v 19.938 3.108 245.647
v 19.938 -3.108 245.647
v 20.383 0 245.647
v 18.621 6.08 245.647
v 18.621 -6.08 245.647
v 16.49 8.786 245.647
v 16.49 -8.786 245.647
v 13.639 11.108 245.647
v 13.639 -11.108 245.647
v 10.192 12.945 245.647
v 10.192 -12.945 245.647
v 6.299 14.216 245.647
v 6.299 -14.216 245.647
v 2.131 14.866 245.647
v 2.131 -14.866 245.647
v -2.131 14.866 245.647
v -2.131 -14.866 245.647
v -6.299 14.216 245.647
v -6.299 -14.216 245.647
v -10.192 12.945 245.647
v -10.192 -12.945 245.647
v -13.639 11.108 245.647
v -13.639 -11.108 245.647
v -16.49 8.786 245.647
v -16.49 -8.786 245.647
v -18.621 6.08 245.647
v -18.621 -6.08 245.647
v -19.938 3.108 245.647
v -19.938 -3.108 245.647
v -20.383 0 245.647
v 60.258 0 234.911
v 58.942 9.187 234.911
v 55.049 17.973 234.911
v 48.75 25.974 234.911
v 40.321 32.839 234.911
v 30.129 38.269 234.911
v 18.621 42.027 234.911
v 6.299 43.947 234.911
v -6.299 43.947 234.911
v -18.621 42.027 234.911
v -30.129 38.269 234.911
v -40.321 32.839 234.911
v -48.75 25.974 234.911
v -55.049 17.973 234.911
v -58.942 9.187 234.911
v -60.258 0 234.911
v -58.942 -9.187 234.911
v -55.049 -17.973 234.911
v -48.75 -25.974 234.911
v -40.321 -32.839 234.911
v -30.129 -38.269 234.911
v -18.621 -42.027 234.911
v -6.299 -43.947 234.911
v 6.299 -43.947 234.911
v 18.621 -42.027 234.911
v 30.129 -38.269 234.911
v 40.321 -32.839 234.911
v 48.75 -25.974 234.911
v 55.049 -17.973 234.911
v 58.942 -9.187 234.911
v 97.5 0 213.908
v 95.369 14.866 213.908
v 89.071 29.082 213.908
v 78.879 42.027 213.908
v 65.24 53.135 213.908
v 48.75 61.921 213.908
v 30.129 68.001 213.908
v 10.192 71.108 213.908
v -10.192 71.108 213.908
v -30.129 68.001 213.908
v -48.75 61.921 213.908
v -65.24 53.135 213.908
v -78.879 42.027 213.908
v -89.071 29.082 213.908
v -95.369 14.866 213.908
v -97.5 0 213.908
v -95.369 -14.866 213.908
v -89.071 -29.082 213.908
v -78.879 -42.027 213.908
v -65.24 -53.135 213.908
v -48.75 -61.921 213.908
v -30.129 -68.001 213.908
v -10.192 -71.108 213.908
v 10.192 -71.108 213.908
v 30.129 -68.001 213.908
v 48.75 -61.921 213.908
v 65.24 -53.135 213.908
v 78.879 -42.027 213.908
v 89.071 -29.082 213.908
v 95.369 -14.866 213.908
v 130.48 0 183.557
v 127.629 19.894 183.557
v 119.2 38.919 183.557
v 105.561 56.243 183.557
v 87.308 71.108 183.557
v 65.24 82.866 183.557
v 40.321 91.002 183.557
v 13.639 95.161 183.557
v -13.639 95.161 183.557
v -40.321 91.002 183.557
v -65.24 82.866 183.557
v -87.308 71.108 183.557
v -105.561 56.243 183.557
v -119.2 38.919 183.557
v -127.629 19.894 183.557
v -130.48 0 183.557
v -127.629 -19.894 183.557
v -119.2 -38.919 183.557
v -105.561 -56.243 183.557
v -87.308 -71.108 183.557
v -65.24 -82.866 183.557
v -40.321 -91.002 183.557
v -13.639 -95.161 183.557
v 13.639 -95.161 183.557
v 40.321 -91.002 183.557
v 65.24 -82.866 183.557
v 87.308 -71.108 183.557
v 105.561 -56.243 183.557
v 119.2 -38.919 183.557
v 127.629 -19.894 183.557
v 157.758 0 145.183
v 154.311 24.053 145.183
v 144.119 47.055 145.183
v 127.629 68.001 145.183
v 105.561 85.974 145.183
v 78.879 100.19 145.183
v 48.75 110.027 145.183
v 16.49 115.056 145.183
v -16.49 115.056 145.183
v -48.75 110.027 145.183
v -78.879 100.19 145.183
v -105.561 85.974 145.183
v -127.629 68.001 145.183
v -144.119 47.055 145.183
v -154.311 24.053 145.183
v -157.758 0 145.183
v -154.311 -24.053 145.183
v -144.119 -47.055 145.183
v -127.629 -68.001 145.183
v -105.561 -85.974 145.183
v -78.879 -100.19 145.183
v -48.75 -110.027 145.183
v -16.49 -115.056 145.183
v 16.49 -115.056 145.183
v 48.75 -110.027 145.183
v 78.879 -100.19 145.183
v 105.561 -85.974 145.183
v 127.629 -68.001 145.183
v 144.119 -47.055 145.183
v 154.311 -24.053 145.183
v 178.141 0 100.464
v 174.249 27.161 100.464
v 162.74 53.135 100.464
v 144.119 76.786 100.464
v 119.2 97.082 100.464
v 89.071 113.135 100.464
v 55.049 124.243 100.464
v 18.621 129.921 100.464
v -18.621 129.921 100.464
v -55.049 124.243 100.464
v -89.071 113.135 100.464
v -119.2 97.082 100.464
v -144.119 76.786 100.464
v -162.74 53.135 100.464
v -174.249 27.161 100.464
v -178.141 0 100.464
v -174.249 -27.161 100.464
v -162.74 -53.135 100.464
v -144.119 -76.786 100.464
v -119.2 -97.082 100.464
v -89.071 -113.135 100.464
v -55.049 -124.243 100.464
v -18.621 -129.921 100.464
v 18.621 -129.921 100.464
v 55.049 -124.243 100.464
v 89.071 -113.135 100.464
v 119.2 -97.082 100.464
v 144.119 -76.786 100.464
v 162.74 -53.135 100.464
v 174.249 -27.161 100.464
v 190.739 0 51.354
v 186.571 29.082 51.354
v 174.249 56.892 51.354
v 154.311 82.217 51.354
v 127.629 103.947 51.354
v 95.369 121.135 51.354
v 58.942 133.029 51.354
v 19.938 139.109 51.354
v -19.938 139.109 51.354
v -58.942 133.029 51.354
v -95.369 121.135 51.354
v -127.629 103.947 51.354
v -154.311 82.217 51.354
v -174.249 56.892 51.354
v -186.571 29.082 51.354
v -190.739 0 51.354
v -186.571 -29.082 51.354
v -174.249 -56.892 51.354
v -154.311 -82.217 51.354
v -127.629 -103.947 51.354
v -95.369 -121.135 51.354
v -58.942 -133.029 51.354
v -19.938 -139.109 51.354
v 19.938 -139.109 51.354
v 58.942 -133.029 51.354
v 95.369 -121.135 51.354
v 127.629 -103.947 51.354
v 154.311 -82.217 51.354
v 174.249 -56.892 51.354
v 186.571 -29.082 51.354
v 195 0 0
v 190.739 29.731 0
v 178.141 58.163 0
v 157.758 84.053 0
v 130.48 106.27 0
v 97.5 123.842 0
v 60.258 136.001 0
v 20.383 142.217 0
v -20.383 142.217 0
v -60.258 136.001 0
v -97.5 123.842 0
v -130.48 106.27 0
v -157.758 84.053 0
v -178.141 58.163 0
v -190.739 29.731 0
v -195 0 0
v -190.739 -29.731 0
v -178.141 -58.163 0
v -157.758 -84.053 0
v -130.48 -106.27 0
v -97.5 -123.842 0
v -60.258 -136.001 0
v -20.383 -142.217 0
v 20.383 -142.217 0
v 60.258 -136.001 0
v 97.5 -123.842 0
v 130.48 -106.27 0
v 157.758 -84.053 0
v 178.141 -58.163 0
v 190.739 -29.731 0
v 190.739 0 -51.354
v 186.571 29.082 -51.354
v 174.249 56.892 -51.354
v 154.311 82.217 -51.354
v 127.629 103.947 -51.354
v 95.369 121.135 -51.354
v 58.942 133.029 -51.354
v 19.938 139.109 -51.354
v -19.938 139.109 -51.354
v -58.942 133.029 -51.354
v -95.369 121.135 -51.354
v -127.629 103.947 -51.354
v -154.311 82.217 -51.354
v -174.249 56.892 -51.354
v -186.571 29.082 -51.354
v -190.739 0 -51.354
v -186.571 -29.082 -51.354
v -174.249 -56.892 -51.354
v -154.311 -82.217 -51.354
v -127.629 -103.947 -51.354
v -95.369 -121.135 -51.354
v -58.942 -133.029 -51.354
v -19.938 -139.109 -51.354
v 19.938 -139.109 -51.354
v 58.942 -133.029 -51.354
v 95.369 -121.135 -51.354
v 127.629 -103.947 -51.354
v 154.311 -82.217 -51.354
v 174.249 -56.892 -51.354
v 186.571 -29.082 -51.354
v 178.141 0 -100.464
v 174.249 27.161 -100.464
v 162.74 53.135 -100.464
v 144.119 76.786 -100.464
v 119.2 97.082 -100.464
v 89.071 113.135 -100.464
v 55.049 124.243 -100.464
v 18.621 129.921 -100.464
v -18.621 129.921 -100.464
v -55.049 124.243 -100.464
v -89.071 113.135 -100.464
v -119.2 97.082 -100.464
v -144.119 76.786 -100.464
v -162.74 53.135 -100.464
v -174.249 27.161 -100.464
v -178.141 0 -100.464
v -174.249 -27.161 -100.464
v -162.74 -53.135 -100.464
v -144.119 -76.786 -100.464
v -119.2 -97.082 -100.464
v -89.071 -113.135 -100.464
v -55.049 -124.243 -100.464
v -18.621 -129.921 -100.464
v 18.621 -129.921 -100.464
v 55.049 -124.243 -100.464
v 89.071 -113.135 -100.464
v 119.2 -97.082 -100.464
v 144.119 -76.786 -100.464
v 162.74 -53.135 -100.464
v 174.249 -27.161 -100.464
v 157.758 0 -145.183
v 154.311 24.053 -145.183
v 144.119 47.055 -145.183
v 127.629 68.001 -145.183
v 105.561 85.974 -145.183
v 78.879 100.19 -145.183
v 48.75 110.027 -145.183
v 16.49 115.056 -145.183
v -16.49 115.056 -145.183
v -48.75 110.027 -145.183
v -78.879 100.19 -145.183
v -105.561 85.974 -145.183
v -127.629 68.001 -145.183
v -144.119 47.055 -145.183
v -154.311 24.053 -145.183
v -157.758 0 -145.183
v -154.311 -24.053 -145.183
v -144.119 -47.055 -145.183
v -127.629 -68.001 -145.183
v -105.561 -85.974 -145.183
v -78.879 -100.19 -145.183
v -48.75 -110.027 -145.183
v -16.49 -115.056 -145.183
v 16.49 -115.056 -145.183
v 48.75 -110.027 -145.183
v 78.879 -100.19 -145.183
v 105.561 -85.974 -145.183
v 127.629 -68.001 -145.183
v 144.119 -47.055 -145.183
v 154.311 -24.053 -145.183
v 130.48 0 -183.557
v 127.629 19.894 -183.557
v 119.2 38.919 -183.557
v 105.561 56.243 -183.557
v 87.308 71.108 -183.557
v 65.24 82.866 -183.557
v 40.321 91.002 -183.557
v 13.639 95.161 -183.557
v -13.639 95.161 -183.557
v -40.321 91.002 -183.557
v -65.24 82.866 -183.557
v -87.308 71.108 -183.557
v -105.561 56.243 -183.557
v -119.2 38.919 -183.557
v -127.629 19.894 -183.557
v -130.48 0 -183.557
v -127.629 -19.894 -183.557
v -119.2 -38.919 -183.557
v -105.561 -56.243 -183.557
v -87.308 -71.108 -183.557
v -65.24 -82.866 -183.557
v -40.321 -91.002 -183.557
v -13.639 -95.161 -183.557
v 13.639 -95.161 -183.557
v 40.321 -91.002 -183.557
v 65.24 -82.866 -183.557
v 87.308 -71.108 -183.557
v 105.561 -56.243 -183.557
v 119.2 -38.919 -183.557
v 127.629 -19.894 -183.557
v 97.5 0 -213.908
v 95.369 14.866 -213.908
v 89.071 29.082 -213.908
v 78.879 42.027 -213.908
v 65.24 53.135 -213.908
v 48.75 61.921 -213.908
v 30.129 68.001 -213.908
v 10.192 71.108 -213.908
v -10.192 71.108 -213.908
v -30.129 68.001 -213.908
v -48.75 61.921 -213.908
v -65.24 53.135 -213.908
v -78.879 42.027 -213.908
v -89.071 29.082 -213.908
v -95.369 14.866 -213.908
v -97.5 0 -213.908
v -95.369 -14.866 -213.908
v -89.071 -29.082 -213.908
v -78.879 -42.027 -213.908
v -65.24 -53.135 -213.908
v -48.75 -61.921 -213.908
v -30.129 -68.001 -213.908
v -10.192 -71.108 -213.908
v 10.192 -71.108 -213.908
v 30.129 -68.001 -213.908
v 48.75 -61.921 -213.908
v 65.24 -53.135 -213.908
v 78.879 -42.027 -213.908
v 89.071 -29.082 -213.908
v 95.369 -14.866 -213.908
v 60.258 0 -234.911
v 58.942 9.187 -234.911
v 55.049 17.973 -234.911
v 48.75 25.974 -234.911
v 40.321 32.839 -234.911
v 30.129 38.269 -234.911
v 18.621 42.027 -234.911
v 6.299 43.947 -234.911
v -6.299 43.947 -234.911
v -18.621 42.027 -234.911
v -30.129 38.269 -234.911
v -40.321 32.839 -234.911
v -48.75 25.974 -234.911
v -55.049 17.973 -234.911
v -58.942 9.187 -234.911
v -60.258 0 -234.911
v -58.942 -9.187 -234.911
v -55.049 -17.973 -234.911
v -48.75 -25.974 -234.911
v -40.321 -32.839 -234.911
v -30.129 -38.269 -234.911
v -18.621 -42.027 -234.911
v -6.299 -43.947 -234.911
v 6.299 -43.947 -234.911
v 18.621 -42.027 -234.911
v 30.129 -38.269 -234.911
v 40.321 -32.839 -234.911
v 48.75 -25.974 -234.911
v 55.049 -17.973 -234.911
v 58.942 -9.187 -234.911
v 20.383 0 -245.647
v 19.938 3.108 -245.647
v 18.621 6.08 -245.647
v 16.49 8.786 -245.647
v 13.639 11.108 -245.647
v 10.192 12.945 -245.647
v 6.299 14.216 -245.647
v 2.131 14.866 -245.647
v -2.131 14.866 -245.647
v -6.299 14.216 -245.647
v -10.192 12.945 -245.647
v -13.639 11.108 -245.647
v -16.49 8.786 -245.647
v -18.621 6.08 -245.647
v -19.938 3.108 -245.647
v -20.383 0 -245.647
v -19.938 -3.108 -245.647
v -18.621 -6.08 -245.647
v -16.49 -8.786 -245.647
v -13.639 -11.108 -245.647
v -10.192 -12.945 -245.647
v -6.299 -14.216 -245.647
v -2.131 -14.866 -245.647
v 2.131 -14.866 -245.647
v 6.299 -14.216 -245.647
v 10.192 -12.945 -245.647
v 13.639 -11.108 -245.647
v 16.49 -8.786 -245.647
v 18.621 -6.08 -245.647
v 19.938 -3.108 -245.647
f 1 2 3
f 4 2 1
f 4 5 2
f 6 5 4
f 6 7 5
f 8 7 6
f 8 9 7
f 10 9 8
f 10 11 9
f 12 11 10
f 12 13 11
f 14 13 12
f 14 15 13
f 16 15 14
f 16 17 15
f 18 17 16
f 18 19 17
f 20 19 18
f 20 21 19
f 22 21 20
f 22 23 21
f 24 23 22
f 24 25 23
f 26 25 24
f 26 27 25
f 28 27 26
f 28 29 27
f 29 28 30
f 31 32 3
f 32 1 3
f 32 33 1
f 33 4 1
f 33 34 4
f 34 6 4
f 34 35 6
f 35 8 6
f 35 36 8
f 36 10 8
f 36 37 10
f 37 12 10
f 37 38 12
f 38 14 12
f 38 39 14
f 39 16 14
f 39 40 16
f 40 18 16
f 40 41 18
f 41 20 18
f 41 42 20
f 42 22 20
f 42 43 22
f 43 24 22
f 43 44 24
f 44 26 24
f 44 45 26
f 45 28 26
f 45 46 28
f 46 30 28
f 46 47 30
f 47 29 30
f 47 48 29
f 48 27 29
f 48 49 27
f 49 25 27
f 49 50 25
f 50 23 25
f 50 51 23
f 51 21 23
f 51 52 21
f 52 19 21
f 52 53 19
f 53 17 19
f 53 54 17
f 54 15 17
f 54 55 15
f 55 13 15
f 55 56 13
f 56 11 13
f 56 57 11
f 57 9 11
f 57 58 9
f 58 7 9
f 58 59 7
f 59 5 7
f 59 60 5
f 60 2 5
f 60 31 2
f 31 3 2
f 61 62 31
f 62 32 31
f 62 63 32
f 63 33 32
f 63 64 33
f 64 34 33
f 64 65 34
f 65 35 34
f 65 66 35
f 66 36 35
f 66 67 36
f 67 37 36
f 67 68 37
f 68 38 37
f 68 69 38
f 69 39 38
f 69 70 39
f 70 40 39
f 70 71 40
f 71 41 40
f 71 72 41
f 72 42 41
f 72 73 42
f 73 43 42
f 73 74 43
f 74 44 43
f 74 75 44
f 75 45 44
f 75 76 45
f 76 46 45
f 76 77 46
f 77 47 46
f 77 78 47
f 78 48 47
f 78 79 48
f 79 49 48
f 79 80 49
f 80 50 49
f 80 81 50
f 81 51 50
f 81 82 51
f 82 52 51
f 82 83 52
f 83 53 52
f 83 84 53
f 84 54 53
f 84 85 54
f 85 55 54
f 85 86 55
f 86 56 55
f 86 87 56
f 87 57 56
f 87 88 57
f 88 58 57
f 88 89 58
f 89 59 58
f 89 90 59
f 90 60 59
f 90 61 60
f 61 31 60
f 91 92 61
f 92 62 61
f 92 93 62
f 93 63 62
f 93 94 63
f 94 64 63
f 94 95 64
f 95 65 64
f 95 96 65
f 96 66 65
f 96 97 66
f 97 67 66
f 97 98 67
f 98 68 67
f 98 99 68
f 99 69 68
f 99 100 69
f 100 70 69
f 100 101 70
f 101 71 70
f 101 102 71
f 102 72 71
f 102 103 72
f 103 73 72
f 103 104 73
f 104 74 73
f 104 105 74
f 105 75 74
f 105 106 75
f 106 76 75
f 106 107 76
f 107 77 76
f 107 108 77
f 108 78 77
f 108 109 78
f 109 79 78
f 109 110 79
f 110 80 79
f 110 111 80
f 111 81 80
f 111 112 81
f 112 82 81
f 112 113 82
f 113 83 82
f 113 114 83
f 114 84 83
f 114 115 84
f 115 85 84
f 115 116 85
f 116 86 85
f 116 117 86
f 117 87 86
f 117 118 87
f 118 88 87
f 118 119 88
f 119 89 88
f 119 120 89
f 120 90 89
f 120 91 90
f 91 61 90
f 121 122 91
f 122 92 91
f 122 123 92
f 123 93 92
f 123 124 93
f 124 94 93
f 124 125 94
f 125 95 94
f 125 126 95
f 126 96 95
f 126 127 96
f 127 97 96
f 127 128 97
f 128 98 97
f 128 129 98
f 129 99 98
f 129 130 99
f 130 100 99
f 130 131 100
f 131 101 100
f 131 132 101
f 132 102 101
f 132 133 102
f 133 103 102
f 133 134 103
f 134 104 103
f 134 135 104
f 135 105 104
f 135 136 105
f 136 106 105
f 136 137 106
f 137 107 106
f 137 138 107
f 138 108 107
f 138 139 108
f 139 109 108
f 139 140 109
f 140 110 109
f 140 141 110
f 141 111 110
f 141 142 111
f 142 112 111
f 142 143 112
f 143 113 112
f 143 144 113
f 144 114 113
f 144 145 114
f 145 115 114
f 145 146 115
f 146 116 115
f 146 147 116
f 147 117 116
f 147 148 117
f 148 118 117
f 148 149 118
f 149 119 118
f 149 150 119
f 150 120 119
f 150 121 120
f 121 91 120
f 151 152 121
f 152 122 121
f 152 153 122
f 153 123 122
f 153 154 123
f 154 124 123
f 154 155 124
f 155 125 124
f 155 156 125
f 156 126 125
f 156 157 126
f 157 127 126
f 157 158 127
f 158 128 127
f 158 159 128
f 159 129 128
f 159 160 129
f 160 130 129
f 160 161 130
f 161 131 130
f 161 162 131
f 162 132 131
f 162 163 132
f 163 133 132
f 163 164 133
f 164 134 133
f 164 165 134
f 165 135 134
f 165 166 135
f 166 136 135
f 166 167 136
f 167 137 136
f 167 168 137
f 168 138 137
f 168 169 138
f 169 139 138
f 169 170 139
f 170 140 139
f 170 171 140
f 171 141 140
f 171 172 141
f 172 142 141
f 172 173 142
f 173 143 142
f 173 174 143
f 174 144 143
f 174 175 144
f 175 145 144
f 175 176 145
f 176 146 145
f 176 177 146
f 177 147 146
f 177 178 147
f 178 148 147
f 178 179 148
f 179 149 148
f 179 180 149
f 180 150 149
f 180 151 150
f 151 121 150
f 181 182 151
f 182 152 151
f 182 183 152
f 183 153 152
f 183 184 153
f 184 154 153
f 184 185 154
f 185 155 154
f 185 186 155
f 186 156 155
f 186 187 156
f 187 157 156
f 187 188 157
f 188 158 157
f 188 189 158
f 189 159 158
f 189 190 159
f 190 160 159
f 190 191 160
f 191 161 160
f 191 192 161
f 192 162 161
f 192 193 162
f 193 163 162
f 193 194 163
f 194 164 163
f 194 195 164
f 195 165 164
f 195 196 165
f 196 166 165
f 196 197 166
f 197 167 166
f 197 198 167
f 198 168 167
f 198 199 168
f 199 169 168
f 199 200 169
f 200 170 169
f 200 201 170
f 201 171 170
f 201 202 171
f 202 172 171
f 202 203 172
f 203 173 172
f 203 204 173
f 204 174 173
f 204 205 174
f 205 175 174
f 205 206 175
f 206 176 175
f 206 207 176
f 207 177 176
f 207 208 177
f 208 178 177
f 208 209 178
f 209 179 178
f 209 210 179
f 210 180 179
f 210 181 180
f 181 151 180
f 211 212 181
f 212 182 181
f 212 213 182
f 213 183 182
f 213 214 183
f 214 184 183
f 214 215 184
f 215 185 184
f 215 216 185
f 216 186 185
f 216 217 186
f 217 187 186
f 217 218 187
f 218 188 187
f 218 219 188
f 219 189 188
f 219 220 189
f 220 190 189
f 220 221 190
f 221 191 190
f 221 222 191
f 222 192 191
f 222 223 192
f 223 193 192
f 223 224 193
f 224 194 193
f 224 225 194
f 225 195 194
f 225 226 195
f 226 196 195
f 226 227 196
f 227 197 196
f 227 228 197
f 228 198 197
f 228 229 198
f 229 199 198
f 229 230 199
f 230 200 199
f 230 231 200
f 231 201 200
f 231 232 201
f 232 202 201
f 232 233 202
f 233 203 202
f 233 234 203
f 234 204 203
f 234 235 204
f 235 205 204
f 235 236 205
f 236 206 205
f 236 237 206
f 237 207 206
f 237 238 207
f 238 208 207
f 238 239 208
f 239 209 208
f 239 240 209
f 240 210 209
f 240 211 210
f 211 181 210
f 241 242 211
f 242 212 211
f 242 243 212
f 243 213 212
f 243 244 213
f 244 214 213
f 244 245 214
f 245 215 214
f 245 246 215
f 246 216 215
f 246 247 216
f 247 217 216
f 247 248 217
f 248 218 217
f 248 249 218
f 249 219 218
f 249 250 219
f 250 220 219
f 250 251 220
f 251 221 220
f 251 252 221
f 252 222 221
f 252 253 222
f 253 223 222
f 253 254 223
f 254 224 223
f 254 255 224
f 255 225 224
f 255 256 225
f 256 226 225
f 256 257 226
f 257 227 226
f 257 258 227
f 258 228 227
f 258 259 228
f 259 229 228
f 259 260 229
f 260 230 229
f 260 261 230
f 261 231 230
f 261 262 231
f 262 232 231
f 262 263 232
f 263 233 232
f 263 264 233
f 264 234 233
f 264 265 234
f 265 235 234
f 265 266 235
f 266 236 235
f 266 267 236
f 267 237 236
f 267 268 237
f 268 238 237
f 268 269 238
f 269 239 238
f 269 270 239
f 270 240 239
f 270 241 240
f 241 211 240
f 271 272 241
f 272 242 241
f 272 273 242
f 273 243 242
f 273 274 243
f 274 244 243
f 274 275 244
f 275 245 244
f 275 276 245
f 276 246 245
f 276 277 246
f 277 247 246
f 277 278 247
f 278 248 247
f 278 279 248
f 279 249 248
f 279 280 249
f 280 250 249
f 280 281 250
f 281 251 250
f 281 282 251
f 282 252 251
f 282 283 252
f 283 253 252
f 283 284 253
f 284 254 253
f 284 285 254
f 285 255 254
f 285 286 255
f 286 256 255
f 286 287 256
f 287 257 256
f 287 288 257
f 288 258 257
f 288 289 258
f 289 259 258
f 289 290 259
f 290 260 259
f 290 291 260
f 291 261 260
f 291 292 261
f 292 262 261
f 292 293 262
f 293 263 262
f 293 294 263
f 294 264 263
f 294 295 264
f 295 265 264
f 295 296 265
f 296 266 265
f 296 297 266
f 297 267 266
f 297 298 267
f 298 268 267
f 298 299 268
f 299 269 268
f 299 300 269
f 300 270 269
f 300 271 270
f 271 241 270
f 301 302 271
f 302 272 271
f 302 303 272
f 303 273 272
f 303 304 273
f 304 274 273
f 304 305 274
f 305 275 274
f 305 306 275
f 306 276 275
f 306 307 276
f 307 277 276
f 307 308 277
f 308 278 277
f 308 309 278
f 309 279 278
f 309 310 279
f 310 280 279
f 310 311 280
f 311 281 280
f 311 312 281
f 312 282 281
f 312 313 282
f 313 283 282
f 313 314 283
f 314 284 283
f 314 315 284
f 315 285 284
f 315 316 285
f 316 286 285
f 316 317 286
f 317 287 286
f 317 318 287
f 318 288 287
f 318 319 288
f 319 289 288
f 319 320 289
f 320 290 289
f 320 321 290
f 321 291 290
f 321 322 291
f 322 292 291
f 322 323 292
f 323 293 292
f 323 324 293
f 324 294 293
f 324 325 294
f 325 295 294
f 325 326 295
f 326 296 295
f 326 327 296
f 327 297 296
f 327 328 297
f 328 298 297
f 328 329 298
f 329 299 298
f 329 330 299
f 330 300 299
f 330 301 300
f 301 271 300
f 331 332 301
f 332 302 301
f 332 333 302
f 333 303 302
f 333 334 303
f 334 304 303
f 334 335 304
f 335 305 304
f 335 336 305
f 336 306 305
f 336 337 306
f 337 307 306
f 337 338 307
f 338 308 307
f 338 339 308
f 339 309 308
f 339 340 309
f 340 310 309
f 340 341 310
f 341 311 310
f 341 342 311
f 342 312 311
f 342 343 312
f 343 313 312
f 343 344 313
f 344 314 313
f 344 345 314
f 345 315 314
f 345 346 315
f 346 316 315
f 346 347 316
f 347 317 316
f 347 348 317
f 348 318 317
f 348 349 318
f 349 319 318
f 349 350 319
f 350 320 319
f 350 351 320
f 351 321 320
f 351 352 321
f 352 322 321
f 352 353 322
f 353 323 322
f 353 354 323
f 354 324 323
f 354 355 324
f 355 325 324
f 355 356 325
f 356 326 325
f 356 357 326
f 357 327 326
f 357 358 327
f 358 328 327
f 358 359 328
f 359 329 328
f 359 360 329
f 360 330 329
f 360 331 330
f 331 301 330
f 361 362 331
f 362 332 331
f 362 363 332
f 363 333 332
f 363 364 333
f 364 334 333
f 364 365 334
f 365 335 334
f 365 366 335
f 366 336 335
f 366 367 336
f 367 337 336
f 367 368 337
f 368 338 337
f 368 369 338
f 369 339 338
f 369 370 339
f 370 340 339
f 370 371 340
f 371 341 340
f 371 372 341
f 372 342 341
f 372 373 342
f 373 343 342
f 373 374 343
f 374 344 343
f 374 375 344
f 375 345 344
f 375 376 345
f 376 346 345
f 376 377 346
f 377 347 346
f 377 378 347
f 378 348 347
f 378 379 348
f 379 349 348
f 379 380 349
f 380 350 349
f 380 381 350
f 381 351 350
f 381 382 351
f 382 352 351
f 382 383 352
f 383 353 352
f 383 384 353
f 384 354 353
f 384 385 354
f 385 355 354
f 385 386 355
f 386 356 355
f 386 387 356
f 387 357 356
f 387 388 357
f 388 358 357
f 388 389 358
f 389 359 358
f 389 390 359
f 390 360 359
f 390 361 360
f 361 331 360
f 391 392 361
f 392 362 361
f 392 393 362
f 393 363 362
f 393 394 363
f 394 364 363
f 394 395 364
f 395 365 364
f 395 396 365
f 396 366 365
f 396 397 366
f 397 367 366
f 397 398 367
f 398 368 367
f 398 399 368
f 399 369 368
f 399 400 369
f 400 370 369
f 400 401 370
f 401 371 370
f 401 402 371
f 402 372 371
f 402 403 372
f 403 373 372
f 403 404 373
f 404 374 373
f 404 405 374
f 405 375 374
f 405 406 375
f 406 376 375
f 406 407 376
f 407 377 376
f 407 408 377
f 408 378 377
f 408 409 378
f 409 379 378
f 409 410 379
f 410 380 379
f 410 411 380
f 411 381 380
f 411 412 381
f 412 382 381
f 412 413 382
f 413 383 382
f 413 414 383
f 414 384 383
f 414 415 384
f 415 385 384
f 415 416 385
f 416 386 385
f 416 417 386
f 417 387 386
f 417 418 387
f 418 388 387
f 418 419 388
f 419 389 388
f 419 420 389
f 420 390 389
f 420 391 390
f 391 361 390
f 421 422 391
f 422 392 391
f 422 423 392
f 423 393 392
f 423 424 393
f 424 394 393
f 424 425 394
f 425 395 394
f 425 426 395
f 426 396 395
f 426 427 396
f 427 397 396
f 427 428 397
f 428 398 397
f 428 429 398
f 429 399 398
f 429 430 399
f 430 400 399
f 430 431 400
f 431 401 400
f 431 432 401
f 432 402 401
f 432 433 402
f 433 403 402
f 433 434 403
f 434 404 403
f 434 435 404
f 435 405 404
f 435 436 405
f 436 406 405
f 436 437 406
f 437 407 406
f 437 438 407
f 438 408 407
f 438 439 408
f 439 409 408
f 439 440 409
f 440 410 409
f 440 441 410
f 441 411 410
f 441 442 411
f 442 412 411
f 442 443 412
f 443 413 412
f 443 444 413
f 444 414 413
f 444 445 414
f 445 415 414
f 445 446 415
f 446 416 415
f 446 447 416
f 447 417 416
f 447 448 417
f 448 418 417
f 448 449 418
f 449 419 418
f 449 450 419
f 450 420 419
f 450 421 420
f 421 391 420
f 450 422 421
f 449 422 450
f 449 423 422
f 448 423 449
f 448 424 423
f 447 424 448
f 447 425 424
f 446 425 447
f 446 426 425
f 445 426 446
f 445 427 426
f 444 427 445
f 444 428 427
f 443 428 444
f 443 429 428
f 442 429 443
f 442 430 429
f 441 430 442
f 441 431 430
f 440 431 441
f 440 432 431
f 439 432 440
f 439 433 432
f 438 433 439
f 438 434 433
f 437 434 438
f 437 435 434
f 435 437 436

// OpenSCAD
// Generated by SolidPython 1.0.1 on 2020-07-29 00:46:52


scale(v = [15, 11, 19]) {
	sphere(r = 13);
}
/***********************************************
*********      SolidPython code:      **********
************************************************
 
# import packages: SolidPython
from solid import *
from solid.utils import *
from itertools import chain, combinations, permutations


class Resize:

    def __init__(self, scad_file):
        self.scad_file = scad_file
        #self.scad_file = import_scad(scad_file)
        # cone/cylinder param:
        self.r1 = 0
        self.r2 = 0
        self.h = 0
        # rectangular prism param:
        self.w = 0
        self.l = 0
        # ellipse param:
        self.r = 0

    # import OpenScad code (file name corresponds to shape)


    # classify shape + parameters
    def assign(self, param1, param2, param3):
        if self.scad_file == 'cone.scad':
            self.r1 = param1
            self.r2 = param2
            self.h = param3
        elif self.scad_file == 'cylinder.scad':
            self.r1 = param1
            self.r2 = param2
            self.h = param3
        elif self.scad_file == 'rectangularPrism.scad':
            self.h = param1
            self.l = param2
            self.w = param3
        else:
            self.r = param1
            self.h = param2

    # resize parameters
    def iterate(self):
        x = range(3, 20, 2)
        i = 1
        if self.scad_file == 'cone.scad':
            tempList = list(permutations(x, 2))
            for temp in tempList:
                param1 = temp[0]
                param2 = temp[1]
                filepath = 'produced_scad_files/' + 'cone' + str(param1) + '_' + str(param2) + '_' + '.scad'
                scad_render_to_file(cylinder(h=param1, r1=param2, r2=0), filepath)

        elif self.scad_file == 'cylinder.scad':
            tempList = list(permutations(x, 3))
            for temp in tempList:
                param1 = temp[0]
                param2 = temp[1]
                filepath = 'produced_scad_files/' + 'cylinder' + str(param1) + '_' + str(param2) + '_' + '.scad'
                scad_render_to_file(cylinder(h=param1, r1=param2, r2=param2), filepath)

        elif self.scad_file == 'rectangularPrism.scad':
            tempList = list(permutations(x, 3))
            for temp in tempList:
                param1 = temp[0]
                param2 = temp[1]
                param3 = temp[2]
                filepath = 'produced_scad_files/' + 'rectangularPrism' + str(param1) + '_' + str(param2) + '_' + str(
                    param3) + '.scad'
                scad_render_to_file(cube(size=(param1, param2, param3)), filepath)

        elif self.scad_file == 'ellipse.scad':
            tempList = list(permutations(x, 4))
            for temp in tempList:
                param1 = temp[0]
                param2 = temp[1]
                param3 = temp[2]
                param4 = temp[3]
                filepath = 'produced_scad_files/' + 'ellipse' + str(param1) + '_' + str(param2) + '_' + str(param3) + '_' + str(param4) + '.scad'
                scad_render_to_file(scale([param1, param2, param3])(sphere(r=param4)), filepath)

    def render_to_scadfile(self):
        scad_render_to_file(scad, 'example.scad') 
 
************************************************/
